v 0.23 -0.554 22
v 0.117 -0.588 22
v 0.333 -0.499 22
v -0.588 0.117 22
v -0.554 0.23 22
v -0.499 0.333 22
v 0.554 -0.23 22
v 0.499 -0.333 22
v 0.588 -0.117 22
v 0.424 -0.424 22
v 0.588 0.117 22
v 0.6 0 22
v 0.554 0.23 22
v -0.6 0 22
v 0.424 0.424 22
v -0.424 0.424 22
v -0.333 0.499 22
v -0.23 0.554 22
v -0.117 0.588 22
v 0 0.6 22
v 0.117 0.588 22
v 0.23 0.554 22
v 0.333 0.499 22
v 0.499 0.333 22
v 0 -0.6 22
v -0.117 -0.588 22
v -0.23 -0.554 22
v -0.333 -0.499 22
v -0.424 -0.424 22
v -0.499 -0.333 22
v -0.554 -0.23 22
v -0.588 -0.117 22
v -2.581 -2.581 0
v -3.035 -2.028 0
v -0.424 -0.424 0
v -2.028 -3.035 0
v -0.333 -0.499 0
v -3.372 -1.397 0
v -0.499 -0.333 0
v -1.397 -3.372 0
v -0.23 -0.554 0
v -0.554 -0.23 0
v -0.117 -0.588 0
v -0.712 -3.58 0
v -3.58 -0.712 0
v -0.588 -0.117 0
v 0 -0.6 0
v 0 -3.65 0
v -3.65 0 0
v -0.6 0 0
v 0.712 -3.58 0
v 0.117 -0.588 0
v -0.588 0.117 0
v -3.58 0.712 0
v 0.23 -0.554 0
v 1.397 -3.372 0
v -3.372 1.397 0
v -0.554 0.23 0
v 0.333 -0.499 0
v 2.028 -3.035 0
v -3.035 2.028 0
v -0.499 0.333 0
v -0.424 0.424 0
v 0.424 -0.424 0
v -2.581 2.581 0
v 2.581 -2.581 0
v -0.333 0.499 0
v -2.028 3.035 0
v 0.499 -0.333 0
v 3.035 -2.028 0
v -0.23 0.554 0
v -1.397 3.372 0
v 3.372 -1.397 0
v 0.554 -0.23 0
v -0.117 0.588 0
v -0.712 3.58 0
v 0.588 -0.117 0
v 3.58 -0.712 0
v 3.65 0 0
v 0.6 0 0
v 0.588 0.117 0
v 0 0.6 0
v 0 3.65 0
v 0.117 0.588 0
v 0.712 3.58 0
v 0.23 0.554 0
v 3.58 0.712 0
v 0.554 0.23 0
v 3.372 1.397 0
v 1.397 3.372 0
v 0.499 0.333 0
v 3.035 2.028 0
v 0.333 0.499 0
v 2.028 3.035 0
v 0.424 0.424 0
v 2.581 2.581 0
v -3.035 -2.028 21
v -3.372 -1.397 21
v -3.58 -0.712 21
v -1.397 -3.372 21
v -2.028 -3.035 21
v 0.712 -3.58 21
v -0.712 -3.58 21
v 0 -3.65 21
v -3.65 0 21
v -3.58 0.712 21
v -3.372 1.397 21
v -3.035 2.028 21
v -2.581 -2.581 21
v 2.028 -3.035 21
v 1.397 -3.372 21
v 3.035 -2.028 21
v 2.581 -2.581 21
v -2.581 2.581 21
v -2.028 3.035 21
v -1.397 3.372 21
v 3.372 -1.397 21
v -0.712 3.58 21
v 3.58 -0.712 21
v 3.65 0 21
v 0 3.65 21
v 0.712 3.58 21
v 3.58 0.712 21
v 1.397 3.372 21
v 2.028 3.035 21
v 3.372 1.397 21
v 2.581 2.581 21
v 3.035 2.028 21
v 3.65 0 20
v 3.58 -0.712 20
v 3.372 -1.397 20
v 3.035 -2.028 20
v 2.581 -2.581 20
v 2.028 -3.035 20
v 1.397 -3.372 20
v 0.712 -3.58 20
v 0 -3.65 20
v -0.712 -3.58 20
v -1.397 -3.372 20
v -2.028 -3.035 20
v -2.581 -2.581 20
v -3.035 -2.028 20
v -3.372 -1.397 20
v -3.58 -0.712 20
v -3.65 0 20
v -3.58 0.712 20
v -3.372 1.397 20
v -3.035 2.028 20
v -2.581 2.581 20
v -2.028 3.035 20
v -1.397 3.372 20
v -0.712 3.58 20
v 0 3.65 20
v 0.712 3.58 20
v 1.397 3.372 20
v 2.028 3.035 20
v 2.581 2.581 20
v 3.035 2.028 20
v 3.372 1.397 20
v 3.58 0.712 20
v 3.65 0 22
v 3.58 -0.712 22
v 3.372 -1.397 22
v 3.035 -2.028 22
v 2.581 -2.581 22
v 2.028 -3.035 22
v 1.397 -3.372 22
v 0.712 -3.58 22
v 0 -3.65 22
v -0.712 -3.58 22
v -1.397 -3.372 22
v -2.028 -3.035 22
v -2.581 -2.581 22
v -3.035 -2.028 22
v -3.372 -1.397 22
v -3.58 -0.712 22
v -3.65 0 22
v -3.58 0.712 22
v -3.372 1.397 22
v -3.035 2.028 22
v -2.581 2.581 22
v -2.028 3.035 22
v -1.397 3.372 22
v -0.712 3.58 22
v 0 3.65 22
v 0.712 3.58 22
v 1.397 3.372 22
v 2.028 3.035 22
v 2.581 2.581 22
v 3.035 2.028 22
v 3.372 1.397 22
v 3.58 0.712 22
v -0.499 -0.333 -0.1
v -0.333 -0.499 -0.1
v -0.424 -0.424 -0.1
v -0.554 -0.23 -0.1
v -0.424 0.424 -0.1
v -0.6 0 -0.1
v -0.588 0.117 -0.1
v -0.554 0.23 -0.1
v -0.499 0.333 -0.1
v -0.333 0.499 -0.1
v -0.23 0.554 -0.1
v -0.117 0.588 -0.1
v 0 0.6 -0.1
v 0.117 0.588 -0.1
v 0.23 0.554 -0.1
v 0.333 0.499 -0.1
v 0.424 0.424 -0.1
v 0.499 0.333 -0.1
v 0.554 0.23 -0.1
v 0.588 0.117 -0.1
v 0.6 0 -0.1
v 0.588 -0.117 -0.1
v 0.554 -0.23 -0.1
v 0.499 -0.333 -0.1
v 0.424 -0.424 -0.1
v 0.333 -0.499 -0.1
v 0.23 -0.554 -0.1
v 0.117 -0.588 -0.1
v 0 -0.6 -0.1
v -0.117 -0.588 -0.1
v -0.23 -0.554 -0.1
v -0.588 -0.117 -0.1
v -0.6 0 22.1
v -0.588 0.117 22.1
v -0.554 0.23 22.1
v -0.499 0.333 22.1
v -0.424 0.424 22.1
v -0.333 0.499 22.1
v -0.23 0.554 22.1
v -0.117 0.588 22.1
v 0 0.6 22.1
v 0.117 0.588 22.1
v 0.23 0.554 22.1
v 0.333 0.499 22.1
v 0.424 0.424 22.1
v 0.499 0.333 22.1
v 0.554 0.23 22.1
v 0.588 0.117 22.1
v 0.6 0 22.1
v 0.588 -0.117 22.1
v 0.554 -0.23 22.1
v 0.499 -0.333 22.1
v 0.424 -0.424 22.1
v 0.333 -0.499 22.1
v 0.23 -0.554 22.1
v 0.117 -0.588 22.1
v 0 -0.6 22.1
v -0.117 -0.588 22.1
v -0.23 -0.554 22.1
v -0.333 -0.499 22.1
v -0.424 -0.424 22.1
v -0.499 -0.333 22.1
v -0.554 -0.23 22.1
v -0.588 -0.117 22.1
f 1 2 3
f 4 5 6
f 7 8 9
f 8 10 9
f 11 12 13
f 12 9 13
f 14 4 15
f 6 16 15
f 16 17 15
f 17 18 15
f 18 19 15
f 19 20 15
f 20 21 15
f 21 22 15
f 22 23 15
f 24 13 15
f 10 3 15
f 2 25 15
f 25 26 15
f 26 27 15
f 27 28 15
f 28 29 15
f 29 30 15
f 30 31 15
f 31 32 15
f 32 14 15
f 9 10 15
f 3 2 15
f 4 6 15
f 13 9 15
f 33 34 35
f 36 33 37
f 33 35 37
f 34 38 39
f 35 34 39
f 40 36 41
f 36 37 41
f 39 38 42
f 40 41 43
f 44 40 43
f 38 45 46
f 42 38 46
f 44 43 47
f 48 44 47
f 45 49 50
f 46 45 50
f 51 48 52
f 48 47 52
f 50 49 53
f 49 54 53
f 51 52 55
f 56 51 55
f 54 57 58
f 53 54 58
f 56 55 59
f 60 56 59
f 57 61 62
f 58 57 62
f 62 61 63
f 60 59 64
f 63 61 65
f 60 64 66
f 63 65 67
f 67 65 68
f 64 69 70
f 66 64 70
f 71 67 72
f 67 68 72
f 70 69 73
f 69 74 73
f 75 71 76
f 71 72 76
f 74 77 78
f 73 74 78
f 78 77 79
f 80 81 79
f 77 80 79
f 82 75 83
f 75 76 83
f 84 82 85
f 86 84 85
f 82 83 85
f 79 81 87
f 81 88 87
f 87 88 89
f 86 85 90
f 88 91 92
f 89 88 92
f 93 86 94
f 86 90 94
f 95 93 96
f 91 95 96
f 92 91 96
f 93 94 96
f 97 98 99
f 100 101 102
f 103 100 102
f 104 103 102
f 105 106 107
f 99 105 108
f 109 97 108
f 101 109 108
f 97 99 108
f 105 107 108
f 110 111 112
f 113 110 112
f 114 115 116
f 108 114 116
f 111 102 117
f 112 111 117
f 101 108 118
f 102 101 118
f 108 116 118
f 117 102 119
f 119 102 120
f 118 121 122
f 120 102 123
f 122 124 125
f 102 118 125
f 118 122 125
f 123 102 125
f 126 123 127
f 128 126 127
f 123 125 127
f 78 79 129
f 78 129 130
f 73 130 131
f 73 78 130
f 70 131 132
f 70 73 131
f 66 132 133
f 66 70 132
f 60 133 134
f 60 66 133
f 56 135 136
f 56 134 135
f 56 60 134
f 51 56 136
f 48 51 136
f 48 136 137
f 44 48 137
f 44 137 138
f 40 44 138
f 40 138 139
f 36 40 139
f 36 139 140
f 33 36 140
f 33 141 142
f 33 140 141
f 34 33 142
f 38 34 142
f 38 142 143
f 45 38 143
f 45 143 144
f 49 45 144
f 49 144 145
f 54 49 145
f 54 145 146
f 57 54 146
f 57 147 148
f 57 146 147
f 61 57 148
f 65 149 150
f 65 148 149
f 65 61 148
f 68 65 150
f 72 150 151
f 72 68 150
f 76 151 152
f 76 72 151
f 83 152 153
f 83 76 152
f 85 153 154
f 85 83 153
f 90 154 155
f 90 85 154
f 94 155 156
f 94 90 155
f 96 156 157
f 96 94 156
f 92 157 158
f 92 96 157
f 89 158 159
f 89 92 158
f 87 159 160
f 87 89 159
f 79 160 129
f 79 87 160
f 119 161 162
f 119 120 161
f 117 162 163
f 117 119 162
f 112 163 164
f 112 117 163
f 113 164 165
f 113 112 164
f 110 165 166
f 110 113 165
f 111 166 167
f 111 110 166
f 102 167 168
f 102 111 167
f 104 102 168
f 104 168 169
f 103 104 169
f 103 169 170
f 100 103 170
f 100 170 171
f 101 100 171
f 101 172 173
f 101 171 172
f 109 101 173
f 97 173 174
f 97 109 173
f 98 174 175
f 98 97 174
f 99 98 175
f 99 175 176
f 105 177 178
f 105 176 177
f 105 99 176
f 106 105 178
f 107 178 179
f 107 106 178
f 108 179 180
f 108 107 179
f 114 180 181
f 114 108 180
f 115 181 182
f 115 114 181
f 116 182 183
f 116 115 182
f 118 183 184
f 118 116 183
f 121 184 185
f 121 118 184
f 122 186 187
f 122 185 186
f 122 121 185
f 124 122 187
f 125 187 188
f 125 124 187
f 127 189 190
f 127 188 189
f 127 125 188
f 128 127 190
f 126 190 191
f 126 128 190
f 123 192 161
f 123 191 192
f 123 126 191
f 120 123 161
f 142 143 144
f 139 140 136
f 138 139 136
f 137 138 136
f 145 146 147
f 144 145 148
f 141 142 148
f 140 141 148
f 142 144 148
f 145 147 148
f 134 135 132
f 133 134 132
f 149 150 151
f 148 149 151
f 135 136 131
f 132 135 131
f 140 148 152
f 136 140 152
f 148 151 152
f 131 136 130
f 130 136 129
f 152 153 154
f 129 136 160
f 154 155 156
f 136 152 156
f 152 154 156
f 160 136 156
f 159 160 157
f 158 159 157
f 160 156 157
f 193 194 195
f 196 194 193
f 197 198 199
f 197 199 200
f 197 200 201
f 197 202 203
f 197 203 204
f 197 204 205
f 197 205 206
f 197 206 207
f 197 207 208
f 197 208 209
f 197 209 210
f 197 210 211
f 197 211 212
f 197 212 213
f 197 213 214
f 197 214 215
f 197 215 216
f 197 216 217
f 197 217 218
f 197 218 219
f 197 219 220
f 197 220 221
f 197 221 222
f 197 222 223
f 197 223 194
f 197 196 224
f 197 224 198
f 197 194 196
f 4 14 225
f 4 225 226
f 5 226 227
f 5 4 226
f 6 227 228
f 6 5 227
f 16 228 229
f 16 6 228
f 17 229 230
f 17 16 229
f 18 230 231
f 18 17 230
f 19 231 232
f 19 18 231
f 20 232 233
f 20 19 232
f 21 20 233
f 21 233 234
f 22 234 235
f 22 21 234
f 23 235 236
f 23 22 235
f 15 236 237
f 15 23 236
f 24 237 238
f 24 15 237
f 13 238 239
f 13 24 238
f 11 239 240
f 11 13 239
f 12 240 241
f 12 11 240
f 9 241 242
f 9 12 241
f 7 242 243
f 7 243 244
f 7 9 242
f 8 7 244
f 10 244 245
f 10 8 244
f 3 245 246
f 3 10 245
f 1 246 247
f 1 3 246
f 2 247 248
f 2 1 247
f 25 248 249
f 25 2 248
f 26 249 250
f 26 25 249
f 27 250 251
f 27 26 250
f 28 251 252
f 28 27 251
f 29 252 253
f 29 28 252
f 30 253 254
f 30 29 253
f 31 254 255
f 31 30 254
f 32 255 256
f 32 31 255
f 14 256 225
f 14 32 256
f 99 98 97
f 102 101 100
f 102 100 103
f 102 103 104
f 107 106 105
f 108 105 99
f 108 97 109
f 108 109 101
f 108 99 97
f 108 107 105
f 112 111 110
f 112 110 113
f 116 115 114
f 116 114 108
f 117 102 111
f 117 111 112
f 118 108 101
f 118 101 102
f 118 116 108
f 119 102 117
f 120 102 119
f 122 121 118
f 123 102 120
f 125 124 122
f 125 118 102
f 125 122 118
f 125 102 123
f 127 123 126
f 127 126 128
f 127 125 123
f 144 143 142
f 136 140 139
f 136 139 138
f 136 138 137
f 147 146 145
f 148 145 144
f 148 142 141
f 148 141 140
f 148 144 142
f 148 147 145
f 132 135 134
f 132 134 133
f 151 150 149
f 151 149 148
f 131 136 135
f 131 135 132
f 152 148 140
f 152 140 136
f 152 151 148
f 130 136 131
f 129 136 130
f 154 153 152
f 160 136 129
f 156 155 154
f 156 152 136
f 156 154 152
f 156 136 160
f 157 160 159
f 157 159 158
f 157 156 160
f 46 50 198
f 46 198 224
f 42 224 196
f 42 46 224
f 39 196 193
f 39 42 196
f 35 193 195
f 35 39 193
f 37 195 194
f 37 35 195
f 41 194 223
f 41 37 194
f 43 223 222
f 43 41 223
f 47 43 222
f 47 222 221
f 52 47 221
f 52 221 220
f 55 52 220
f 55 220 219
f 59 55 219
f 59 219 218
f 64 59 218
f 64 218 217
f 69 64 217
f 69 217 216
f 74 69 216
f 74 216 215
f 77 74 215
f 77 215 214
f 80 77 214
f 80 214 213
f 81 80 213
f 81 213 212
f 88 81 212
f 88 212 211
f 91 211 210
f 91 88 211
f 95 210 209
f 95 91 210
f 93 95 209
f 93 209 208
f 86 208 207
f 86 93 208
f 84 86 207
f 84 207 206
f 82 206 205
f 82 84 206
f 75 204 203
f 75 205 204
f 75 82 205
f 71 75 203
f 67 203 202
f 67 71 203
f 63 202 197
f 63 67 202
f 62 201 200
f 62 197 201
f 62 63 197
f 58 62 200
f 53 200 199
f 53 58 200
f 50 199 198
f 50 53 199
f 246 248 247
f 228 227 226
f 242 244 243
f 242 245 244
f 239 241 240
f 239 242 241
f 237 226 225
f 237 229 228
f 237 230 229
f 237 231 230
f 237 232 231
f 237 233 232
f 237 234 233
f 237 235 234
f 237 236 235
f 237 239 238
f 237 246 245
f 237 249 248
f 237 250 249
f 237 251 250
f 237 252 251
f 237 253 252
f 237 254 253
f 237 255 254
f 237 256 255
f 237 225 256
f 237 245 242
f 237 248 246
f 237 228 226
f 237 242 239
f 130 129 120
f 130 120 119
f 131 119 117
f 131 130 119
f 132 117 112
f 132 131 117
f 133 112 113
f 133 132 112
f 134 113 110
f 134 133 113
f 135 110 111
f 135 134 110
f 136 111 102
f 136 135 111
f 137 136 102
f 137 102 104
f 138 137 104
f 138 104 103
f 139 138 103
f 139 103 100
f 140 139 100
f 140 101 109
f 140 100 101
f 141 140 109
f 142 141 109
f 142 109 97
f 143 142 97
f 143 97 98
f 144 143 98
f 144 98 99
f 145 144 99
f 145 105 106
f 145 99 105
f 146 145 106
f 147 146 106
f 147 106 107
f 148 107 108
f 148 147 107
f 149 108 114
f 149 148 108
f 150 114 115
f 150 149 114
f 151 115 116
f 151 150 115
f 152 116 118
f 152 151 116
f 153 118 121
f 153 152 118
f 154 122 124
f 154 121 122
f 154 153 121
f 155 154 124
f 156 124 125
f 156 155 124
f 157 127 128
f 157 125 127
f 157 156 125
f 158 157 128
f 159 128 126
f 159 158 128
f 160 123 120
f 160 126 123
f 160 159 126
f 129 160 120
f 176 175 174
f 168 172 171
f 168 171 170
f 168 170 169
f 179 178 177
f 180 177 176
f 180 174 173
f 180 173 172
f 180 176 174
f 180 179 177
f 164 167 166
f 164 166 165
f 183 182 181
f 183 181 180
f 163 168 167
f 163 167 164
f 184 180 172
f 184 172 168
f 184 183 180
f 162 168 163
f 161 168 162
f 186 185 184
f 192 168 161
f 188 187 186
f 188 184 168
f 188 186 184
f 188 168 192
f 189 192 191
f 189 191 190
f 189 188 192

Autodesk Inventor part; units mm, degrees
ref_plane "YZ Plane" through (0, 0, 0) normal (1, 0, 0) x (0, 1, 0)
ref_plane "XZ Plane" through (0, 0, 0) normal (0, 1, 0) x (-1, 0, 0)
ref_plane "XY Plane" through (0, 0, 0) normal (0, 0, 1) x (1, 0, 0)
sketch "Skizze1" plane through (0, 0, 0) normal (0, 0, 1) x (1, 0, 0)
  circle A0 centre (0, 0) radius 3.65
  dimension "d0" = 7.3
extrude "Extrusion1" add sketch "Skizze1" along normal blind 20
sketch "Skizze4" plane through (0, 0, 20) normal (0, 0, 1) x (1, 0, 0)
  circle A0 centre (0, 0) radius 3.65
extrude "Extrusion4" add sketch "Skizze4" along normal blind 1 separate body
sketch "Skizze5" plane through (0, 0, 21) normal (0, 0, 1) x (1, 0, 0)
  circle A0 centre (0, 0) radius 3.65
extrude "Extrusion5" add sketch "Skizze5" along normal blind 1 separate body
sketch "Skizze7" plane through (0, 0, 0) normal (0, 0, -1) x (-1, 0, 0)
  circle A0 centre (0, 0) radius 0.6
  dimension "d16" = 1.2
extrude "Extrusion7" add sketch "Skizze7" along normal blind 0.1 bodies 1
ref_plane "Arbeitsebene1" through (0, 0, 11) normal (0, 0, -1) x (-1, 0, 0)
mirror "Spiegeln1" about plane through (0, 0, 11) normal (0, 0, -1) of "Extrusion7" bodies 1
properties part number "HV diode Diotec BY16"
